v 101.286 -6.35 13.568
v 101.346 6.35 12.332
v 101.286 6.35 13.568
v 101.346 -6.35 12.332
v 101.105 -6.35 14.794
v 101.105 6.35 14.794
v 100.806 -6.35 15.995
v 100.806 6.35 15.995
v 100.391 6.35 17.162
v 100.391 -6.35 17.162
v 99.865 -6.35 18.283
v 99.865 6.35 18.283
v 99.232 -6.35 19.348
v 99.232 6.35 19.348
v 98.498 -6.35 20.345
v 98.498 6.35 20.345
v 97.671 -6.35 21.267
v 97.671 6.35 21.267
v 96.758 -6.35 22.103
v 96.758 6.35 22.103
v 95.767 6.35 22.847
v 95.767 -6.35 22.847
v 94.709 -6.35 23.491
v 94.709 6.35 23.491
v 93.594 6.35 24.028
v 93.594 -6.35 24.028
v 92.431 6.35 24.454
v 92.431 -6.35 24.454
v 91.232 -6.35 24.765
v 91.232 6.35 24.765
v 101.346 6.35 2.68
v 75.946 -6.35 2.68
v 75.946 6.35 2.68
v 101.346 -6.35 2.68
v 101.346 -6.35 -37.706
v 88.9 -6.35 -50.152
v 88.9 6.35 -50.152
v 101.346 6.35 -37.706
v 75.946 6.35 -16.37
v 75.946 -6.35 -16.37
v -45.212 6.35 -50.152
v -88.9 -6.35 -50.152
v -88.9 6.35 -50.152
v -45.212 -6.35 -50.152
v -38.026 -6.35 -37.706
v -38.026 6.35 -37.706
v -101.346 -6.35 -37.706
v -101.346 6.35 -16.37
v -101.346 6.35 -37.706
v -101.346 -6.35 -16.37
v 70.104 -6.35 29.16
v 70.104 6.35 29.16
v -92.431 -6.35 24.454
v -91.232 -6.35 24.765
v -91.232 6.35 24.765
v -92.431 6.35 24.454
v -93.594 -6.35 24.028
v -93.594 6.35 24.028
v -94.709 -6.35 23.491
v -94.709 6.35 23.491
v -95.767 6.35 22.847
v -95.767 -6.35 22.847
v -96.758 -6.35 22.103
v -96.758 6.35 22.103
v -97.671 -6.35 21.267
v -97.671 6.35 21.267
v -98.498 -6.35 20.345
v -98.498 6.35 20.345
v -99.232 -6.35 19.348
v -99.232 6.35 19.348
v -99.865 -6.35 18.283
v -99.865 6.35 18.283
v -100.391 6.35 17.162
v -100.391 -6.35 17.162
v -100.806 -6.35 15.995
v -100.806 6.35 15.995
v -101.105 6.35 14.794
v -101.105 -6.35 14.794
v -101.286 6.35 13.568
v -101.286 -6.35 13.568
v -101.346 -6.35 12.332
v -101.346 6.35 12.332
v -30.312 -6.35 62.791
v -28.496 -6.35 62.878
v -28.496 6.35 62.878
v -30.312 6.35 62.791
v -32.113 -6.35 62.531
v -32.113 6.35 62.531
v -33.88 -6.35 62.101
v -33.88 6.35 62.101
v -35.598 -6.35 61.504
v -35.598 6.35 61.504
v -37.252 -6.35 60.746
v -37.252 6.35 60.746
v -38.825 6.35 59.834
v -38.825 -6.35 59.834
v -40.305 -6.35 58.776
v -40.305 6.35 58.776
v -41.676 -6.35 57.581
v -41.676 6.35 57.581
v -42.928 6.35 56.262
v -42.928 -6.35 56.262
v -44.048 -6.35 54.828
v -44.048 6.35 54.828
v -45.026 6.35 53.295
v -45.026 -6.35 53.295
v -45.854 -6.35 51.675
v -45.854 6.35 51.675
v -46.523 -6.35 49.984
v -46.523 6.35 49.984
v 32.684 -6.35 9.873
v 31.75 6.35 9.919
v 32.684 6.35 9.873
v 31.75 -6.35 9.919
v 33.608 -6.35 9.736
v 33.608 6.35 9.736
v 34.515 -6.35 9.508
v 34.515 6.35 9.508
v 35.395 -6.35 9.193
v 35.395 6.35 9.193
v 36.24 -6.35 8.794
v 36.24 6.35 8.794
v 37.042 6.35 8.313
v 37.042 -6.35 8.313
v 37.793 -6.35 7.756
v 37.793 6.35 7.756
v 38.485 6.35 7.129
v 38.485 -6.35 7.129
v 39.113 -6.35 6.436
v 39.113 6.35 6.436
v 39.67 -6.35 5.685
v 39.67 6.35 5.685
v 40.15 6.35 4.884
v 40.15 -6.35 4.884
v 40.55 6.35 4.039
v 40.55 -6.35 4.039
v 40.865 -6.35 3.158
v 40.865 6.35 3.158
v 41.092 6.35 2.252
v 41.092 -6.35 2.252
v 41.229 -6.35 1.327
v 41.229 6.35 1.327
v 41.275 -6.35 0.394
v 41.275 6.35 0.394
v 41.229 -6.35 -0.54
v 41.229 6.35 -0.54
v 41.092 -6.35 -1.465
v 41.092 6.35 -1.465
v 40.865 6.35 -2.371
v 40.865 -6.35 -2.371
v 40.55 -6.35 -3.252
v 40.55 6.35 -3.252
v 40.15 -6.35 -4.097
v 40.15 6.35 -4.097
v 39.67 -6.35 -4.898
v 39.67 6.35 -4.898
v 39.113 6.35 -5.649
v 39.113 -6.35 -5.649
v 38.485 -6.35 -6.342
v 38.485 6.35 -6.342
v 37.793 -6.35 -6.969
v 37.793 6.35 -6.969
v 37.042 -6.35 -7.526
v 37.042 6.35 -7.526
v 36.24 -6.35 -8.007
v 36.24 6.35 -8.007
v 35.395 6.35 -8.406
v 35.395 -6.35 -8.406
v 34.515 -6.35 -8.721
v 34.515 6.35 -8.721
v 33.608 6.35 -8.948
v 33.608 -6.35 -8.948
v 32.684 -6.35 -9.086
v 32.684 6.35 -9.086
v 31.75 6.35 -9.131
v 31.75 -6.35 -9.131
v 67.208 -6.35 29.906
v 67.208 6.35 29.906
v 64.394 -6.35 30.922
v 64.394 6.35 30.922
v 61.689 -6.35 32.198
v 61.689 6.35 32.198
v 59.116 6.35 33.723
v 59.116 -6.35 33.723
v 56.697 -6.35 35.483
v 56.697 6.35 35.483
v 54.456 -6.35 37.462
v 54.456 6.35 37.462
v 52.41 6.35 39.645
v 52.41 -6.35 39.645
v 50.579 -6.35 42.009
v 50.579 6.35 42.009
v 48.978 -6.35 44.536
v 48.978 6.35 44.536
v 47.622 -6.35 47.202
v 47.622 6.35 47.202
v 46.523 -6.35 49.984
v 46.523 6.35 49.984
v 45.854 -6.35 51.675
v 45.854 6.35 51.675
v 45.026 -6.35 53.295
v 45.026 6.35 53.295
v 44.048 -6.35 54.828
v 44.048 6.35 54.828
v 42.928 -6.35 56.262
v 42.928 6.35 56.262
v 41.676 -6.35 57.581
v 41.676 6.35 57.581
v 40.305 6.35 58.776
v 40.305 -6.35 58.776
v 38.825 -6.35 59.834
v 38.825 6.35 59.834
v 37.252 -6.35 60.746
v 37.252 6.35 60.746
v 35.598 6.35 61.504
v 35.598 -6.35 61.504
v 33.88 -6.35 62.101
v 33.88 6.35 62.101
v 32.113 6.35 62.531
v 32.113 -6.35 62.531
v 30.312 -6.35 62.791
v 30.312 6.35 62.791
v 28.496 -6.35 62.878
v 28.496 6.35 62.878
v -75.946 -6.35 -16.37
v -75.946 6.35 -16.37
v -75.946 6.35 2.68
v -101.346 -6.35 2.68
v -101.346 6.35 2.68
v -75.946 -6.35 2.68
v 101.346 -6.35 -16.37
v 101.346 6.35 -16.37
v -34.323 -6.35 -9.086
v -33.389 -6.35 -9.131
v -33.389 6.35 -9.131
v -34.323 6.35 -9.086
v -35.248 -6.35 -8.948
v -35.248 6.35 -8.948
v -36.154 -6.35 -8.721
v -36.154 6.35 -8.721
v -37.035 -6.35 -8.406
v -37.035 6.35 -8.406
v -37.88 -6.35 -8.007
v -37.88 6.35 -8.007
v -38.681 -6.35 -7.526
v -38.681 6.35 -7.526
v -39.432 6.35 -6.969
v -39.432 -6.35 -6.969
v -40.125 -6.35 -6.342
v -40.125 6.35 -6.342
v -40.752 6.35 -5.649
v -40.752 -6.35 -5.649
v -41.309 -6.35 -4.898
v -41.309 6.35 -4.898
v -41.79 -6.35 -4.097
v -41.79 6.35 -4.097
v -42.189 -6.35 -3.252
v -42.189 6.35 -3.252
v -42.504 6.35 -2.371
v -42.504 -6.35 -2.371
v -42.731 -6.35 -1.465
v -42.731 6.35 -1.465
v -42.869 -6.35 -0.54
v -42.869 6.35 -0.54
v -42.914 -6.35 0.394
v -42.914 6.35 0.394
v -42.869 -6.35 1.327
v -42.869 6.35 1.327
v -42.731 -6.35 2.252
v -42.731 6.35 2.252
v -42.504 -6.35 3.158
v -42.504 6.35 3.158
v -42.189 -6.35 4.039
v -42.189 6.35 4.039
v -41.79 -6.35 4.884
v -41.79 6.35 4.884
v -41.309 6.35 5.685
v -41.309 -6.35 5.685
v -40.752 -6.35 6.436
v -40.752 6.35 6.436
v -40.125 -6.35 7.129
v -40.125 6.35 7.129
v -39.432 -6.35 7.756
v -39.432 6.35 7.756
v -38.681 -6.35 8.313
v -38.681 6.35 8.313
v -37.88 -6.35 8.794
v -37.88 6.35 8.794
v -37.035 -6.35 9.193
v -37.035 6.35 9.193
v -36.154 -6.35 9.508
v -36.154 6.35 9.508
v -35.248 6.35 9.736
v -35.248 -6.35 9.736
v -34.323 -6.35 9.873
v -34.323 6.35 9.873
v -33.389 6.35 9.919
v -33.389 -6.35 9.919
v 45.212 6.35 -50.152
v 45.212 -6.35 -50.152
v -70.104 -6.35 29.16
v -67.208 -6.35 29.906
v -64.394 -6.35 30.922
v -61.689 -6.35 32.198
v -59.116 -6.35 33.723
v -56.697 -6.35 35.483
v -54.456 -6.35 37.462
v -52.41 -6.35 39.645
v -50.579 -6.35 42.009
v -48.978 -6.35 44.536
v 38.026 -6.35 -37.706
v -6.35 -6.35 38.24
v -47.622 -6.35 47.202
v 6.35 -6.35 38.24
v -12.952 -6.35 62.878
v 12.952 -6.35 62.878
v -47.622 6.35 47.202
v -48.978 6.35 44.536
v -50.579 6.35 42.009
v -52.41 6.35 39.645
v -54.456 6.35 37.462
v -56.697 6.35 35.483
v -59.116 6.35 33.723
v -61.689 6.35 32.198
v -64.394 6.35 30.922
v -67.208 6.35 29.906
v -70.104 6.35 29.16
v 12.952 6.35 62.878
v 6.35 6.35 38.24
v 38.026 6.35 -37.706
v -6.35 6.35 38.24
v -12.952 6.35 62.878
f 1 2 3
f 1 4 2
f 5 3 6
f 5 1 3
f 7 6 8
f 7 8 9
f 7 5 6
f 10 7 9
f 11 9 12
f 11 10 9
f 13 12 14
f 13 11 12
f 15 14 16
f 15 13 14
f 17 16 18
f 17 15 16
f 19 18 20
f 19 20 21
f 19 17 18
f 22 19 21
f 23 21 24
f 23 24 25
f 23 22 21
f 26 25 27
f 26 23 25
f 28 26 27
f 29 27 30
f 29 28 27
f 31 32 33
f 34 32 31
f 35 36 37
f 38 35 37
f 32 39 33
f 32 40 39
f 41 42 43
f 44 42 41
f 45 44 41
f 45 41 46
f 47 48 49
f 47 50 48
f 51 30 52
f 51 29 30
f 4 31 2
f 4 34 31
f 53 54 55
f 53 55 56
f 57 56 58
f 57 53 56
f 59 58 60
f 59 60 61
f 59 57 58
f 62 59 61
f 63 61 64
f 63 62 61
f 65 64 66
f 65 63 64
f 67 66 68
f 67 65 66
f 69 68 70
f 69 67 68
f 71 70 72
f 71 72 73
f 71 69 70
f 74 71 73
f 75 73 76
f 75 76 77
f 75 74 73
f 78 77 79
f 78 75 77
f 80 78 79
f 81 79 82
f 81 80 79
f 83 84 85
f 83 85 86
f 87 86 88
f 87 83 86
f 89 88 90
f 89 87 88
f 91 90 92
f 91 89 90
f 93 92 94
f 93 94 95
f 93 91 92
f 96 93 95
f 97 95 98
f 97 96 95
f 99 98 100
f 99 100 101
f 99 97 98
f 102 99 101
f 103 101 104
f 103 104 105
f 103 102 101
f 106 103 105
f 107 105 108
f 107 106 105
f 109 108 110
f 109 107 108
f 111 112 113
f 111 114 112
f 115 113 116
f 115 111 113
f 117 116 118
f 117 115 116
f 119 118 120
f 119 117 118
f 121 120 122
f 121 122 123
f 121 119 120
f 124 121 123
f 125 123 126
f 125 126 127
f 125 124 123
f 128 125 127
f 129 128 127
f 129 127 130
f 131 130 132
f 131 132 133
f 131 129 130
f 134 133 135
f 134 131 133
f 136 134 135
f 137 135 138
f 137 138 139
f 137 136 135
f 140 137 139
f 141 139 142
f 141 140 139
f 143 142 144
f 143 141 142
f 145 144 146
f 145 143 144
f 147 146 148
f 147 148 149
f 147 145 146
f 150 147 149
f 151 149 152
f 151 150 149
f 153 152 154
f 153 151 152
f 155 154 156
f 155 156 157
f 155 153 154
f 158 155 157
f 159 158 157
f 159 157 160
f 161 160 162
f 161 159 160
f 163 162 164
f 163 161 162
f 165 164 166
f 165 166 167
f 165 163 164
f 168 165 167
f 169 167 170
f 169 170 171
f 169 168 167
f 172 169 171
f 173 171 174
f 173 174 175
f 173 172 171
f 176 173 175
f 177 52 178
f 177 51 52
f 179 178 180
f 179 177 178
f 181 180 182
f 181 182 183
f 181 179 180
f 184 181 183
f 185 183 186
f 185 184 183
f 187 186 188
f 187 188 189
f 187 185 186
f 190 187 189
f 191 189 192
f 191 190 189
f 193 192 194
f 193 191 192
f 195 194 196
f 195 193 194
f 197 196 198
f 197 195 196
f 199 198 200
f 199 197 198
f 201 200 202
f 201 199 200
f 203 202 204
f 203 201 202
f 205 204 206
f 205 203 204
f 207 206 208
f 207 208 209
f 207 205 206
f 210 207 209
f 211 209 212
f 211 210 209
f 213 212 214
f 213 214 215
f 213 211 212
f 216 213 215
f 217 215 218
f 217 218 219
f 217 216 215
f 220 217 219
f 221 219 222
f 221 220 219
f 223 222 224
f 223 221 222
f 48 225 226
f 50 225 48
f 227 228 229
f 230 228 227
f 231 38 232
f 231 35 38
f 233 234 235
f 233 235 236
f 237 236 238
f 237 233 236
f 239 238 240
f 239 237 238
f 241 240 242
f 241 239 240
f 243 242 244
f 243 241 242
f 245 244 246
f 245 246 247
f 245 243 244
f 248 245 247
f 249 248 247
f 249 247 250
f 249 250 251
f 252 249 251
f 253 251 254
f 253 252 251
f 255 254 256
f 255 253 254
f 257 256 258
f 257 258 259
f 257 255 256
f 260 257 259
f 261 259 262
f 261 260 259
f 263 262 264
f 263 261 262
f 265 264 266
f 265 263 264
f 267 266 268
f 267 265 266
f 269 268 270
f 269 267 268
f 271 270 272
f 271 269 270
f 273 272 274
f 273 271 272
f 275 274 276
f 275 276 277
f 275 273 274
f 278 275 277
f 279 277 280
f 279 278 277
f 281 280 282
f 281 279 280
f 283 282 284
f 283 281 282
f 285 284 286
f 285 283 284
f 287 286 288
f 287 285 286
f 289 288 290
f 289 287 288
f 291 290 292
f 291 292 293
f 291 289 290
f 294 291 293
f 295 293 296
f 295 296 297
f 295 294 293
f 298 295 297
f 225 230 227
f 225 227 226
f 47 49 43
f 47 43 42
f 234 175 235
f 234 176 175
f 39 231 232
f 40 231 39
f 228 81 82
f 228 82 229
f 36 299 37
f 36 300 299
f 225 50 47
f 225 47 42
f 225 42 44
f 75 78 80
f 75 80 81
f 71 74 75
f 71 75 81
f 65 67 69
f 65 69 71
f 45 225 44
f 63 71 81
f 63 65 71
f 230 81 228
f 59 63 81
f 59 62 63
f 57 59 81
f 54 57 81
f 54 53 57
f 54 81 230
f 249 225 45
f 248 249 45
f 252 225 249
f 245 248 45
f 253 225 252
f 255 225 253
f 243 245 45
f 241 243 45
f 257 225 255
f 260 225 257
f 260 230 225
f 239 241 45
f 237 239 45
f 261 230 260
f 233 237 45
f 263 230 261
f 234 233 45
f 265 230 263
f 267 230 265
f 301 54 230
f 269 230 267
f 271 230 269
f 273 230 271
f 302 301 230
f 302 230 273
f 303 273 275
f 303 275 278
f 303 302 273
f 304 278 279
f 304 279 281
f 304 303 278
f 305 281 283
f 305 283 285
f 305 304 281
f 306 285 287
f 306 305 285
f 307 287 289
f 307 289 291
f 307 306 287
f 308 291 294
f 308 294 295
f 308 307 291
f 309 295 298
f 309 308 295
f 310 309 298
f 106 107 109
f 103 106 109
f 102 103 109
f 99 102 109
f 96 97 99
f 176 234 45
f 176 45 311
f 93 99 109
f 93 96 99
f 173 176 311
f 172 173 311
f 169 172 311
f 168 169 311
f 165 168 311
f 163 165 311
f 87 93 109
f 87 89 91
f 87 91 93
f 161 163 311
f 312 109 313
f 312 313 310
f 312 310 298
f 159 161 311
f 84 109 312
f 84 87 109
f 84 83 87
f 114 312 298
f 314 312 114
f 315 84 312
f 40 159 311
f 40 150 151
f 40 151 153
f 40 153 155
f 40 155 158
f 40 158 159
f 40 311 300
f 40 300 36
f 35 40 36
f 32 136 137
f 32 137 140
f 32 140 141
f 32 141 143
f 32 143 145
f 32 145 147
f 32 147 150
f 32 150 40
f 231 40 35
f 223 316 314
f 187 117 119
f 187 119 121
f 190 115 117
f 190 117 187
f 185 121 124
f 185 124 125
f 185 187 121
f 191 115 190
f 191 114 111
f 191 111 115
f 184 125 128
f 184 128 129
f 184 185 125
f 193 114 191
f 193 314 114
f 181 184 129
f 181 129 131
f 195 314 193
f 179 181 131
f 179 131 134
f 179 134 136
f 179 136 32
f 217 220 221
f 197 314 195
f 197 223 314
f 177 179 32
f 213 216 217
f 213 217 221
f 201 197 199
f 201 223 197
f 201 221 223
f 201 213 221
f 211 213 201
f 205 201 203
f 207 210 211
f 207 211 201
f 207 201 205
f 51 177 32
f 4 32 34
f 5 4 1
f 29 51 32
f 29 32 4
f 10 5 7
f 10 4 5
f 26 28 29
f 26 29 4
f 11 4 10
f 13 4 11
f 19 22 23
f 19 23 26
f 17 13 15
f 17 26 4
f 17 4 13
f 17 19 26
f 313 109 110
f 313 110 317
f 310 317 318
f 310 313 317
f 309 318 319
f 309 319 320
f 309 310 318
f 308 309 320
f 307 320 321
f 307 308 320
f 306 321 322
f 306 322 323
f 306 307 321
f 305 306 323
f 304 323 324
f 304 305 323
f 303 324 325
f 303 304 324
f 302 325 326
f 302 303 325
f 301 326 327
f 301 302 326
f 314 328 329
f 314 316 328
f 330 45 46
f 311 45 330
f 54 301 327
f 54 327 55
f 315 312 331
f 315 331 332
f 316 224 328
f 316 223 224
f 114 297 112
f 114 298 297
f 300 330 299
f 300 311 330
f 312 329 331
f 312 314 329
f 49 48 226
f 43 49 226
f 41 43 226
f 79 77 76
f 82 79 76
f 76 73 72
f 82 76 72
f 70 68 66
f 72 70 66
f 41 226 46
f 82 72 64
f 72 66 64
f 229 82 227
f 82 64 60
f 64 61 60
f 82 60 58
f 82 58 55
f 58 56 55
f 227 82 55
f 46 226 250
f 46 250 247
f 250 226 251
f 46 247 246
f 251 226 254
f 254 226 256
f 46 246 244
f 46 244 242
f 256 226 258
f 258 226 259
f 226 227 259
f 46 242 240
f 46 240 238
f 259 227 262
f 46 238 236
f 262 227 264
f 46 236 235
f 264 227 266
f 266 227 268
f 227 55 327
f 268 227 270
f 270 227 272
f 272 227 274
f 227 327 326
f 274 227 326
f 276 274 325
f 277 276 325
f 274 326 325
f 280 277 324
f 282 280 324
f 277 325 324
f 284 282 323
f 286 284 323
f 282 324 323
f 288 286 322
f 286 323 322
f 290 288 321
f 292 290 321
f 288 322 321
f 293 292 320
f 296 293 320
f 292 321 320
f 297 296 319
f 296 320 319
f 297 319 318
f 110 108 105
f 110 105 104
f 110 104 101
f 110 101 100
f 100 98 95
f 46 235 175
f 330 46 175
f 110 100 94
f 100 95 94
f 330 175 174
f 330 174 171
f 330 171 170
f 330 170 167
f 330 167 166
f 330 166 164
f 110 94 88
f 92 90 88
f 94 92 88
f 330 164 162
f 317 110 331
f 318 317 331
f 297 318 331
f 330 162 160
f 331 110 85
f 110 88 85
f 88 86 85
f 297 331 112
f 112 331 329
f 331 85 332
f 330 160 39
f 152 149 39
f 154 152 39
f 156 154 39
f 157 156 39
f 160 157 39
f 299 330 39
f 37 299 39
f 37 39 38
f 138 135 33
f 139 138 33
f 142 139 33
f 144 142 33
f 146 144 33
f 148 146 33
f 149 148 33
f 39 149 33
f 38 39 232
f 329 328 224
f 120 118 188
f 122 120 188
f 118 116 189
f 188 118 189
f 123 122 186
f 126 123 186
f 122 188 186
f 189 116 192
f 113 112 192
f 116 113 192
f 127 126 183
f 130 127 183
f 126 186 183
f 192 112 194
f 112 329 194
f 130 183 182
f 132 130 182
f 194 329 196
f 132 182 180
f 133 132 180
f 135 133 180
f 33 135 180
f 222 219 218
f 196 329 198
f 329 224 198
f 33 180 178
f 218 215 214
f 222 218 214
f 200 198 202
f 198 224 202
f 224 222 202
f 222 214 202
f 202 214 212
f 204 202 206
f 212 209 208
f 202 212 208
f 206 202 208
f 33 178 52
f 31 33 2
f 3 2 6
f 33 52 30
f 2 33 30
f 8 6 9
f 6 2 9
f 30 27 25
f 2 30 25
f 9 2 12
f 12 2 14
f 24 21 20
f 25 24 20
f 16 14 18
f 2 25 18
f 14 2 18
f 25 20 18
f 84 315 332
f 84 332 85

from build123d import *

# Parameters (mm, degrees)
F1_DEPTH = 6.35
F2_SIZE  = 12.446


with BuildPart() as f1:
    # F0 (on Front) → F1 (new body, symmetric)
    with BuildSketch(Plane.XZ):
        with BuildLine():
            Line((6.35, 38.239533), (0, 38.239533))
            Line((0, 38.239533), (-6.35, 38.239533))
            Line((-6.35, 38.239533), (-12.951732, 62.877533))
            Line((-12.951732, 62.877533), (-28.495513, 62.877533))
            ThreePointArc((-28.495513, 62.877533), (-39.577525, 59.32242), (-46.523284, 49.983992))
            ThreePointArc((-46.523284, 49.983992), (-55.553194, 36.446133), (-70.104, 29.160052))
            Line((-70.104, 29.160052), (-91.232227, 24.765415))
            ThreePointArc((-91.232227, 24.765415), (-98.498286, 20.345425), (-101.346, 12.331533))
            Line((-101.346, 12.331533), (-101.346, 2.679533))
            Line((-101.346, 2.679533), (-75.946, 2.679533))
            Line((-75.946, 2.679533), (-75.946, -16.370467))
            Line((-75.946, -16.370467), (-101.346, -16.370467))
            Line((-101.346, -16.370467), (-101.346, -50.152467))
            Line((-101.346, -50.152467), (-45.212, -50.152467))
            Line((-45.212, -50.152467), (-38.026299, -37.706467))
            Line((-38.026299, -37.706467), (0, -37.706467))
            Line((0, -37.706467), (38.026299, -37.706467))
            Line((38.026299, -37.706467), (45.212, -50.152467))
            Line((45.212, -50.152467), (101.346, -50.152467))
            Line((101.346, -50.152467), (101.346, -16.370467))
            Line((101.346, -16.370467), (75.946, -16.370467))
            Line((75.946, -16.370467), (75.946, 2.679533))
            Line((75.946, 2.679533), (101.346, 2.679533))
            Line((101.346, 2.679533), (101.346, 12.331533))
            ThreePointArc((101.346, 12.331533), (98.498286, 20.345425), (91.232227, 24.765415))
            Line((91.232227, 24.765415), (70.104, 29.160052))
            ThreePointArc((70.104, 29.160052), (55.553194, 36.446133), (46.523284, 49.983992))
            ThreePointArc((46.523284, 49.983992), (39.577525, 59.32242), (28.495513, 62.877533))
            Line((28.495513, 62.877533), (12.951732, 62.877533))
            Line((12.951732, 62.877533), (6.35, 38.239533))
        make_face()
        with BuildLine():
            ThreePointArc((-33.38948, -9.131467), (-42.91448, 0.393533), (-33.38948, 9.918533))
            Line((-33.38948, 9.918533), (31.75, 9.918533))
            ThreePointArc((31.75, 9.918533), (41.275, 0.393533), (31.75, -9.131467))
            Line((31.75, -9.131467), (-33.38948, -9.131467))
        make_face(mode=Mode.SUBTRACT)
    extrude(amount=F1_DEPTH, both=True)

    # F2
    f2_edges = [f1.edges().sort_by_distance(p)[0] for p in [
        (-101.346, 0, -50.152467),
        (101.346, 0, -50.152467),
    ]]
    chamfer(f2_edges, length=F2_SIZE)


solid = f1.part
